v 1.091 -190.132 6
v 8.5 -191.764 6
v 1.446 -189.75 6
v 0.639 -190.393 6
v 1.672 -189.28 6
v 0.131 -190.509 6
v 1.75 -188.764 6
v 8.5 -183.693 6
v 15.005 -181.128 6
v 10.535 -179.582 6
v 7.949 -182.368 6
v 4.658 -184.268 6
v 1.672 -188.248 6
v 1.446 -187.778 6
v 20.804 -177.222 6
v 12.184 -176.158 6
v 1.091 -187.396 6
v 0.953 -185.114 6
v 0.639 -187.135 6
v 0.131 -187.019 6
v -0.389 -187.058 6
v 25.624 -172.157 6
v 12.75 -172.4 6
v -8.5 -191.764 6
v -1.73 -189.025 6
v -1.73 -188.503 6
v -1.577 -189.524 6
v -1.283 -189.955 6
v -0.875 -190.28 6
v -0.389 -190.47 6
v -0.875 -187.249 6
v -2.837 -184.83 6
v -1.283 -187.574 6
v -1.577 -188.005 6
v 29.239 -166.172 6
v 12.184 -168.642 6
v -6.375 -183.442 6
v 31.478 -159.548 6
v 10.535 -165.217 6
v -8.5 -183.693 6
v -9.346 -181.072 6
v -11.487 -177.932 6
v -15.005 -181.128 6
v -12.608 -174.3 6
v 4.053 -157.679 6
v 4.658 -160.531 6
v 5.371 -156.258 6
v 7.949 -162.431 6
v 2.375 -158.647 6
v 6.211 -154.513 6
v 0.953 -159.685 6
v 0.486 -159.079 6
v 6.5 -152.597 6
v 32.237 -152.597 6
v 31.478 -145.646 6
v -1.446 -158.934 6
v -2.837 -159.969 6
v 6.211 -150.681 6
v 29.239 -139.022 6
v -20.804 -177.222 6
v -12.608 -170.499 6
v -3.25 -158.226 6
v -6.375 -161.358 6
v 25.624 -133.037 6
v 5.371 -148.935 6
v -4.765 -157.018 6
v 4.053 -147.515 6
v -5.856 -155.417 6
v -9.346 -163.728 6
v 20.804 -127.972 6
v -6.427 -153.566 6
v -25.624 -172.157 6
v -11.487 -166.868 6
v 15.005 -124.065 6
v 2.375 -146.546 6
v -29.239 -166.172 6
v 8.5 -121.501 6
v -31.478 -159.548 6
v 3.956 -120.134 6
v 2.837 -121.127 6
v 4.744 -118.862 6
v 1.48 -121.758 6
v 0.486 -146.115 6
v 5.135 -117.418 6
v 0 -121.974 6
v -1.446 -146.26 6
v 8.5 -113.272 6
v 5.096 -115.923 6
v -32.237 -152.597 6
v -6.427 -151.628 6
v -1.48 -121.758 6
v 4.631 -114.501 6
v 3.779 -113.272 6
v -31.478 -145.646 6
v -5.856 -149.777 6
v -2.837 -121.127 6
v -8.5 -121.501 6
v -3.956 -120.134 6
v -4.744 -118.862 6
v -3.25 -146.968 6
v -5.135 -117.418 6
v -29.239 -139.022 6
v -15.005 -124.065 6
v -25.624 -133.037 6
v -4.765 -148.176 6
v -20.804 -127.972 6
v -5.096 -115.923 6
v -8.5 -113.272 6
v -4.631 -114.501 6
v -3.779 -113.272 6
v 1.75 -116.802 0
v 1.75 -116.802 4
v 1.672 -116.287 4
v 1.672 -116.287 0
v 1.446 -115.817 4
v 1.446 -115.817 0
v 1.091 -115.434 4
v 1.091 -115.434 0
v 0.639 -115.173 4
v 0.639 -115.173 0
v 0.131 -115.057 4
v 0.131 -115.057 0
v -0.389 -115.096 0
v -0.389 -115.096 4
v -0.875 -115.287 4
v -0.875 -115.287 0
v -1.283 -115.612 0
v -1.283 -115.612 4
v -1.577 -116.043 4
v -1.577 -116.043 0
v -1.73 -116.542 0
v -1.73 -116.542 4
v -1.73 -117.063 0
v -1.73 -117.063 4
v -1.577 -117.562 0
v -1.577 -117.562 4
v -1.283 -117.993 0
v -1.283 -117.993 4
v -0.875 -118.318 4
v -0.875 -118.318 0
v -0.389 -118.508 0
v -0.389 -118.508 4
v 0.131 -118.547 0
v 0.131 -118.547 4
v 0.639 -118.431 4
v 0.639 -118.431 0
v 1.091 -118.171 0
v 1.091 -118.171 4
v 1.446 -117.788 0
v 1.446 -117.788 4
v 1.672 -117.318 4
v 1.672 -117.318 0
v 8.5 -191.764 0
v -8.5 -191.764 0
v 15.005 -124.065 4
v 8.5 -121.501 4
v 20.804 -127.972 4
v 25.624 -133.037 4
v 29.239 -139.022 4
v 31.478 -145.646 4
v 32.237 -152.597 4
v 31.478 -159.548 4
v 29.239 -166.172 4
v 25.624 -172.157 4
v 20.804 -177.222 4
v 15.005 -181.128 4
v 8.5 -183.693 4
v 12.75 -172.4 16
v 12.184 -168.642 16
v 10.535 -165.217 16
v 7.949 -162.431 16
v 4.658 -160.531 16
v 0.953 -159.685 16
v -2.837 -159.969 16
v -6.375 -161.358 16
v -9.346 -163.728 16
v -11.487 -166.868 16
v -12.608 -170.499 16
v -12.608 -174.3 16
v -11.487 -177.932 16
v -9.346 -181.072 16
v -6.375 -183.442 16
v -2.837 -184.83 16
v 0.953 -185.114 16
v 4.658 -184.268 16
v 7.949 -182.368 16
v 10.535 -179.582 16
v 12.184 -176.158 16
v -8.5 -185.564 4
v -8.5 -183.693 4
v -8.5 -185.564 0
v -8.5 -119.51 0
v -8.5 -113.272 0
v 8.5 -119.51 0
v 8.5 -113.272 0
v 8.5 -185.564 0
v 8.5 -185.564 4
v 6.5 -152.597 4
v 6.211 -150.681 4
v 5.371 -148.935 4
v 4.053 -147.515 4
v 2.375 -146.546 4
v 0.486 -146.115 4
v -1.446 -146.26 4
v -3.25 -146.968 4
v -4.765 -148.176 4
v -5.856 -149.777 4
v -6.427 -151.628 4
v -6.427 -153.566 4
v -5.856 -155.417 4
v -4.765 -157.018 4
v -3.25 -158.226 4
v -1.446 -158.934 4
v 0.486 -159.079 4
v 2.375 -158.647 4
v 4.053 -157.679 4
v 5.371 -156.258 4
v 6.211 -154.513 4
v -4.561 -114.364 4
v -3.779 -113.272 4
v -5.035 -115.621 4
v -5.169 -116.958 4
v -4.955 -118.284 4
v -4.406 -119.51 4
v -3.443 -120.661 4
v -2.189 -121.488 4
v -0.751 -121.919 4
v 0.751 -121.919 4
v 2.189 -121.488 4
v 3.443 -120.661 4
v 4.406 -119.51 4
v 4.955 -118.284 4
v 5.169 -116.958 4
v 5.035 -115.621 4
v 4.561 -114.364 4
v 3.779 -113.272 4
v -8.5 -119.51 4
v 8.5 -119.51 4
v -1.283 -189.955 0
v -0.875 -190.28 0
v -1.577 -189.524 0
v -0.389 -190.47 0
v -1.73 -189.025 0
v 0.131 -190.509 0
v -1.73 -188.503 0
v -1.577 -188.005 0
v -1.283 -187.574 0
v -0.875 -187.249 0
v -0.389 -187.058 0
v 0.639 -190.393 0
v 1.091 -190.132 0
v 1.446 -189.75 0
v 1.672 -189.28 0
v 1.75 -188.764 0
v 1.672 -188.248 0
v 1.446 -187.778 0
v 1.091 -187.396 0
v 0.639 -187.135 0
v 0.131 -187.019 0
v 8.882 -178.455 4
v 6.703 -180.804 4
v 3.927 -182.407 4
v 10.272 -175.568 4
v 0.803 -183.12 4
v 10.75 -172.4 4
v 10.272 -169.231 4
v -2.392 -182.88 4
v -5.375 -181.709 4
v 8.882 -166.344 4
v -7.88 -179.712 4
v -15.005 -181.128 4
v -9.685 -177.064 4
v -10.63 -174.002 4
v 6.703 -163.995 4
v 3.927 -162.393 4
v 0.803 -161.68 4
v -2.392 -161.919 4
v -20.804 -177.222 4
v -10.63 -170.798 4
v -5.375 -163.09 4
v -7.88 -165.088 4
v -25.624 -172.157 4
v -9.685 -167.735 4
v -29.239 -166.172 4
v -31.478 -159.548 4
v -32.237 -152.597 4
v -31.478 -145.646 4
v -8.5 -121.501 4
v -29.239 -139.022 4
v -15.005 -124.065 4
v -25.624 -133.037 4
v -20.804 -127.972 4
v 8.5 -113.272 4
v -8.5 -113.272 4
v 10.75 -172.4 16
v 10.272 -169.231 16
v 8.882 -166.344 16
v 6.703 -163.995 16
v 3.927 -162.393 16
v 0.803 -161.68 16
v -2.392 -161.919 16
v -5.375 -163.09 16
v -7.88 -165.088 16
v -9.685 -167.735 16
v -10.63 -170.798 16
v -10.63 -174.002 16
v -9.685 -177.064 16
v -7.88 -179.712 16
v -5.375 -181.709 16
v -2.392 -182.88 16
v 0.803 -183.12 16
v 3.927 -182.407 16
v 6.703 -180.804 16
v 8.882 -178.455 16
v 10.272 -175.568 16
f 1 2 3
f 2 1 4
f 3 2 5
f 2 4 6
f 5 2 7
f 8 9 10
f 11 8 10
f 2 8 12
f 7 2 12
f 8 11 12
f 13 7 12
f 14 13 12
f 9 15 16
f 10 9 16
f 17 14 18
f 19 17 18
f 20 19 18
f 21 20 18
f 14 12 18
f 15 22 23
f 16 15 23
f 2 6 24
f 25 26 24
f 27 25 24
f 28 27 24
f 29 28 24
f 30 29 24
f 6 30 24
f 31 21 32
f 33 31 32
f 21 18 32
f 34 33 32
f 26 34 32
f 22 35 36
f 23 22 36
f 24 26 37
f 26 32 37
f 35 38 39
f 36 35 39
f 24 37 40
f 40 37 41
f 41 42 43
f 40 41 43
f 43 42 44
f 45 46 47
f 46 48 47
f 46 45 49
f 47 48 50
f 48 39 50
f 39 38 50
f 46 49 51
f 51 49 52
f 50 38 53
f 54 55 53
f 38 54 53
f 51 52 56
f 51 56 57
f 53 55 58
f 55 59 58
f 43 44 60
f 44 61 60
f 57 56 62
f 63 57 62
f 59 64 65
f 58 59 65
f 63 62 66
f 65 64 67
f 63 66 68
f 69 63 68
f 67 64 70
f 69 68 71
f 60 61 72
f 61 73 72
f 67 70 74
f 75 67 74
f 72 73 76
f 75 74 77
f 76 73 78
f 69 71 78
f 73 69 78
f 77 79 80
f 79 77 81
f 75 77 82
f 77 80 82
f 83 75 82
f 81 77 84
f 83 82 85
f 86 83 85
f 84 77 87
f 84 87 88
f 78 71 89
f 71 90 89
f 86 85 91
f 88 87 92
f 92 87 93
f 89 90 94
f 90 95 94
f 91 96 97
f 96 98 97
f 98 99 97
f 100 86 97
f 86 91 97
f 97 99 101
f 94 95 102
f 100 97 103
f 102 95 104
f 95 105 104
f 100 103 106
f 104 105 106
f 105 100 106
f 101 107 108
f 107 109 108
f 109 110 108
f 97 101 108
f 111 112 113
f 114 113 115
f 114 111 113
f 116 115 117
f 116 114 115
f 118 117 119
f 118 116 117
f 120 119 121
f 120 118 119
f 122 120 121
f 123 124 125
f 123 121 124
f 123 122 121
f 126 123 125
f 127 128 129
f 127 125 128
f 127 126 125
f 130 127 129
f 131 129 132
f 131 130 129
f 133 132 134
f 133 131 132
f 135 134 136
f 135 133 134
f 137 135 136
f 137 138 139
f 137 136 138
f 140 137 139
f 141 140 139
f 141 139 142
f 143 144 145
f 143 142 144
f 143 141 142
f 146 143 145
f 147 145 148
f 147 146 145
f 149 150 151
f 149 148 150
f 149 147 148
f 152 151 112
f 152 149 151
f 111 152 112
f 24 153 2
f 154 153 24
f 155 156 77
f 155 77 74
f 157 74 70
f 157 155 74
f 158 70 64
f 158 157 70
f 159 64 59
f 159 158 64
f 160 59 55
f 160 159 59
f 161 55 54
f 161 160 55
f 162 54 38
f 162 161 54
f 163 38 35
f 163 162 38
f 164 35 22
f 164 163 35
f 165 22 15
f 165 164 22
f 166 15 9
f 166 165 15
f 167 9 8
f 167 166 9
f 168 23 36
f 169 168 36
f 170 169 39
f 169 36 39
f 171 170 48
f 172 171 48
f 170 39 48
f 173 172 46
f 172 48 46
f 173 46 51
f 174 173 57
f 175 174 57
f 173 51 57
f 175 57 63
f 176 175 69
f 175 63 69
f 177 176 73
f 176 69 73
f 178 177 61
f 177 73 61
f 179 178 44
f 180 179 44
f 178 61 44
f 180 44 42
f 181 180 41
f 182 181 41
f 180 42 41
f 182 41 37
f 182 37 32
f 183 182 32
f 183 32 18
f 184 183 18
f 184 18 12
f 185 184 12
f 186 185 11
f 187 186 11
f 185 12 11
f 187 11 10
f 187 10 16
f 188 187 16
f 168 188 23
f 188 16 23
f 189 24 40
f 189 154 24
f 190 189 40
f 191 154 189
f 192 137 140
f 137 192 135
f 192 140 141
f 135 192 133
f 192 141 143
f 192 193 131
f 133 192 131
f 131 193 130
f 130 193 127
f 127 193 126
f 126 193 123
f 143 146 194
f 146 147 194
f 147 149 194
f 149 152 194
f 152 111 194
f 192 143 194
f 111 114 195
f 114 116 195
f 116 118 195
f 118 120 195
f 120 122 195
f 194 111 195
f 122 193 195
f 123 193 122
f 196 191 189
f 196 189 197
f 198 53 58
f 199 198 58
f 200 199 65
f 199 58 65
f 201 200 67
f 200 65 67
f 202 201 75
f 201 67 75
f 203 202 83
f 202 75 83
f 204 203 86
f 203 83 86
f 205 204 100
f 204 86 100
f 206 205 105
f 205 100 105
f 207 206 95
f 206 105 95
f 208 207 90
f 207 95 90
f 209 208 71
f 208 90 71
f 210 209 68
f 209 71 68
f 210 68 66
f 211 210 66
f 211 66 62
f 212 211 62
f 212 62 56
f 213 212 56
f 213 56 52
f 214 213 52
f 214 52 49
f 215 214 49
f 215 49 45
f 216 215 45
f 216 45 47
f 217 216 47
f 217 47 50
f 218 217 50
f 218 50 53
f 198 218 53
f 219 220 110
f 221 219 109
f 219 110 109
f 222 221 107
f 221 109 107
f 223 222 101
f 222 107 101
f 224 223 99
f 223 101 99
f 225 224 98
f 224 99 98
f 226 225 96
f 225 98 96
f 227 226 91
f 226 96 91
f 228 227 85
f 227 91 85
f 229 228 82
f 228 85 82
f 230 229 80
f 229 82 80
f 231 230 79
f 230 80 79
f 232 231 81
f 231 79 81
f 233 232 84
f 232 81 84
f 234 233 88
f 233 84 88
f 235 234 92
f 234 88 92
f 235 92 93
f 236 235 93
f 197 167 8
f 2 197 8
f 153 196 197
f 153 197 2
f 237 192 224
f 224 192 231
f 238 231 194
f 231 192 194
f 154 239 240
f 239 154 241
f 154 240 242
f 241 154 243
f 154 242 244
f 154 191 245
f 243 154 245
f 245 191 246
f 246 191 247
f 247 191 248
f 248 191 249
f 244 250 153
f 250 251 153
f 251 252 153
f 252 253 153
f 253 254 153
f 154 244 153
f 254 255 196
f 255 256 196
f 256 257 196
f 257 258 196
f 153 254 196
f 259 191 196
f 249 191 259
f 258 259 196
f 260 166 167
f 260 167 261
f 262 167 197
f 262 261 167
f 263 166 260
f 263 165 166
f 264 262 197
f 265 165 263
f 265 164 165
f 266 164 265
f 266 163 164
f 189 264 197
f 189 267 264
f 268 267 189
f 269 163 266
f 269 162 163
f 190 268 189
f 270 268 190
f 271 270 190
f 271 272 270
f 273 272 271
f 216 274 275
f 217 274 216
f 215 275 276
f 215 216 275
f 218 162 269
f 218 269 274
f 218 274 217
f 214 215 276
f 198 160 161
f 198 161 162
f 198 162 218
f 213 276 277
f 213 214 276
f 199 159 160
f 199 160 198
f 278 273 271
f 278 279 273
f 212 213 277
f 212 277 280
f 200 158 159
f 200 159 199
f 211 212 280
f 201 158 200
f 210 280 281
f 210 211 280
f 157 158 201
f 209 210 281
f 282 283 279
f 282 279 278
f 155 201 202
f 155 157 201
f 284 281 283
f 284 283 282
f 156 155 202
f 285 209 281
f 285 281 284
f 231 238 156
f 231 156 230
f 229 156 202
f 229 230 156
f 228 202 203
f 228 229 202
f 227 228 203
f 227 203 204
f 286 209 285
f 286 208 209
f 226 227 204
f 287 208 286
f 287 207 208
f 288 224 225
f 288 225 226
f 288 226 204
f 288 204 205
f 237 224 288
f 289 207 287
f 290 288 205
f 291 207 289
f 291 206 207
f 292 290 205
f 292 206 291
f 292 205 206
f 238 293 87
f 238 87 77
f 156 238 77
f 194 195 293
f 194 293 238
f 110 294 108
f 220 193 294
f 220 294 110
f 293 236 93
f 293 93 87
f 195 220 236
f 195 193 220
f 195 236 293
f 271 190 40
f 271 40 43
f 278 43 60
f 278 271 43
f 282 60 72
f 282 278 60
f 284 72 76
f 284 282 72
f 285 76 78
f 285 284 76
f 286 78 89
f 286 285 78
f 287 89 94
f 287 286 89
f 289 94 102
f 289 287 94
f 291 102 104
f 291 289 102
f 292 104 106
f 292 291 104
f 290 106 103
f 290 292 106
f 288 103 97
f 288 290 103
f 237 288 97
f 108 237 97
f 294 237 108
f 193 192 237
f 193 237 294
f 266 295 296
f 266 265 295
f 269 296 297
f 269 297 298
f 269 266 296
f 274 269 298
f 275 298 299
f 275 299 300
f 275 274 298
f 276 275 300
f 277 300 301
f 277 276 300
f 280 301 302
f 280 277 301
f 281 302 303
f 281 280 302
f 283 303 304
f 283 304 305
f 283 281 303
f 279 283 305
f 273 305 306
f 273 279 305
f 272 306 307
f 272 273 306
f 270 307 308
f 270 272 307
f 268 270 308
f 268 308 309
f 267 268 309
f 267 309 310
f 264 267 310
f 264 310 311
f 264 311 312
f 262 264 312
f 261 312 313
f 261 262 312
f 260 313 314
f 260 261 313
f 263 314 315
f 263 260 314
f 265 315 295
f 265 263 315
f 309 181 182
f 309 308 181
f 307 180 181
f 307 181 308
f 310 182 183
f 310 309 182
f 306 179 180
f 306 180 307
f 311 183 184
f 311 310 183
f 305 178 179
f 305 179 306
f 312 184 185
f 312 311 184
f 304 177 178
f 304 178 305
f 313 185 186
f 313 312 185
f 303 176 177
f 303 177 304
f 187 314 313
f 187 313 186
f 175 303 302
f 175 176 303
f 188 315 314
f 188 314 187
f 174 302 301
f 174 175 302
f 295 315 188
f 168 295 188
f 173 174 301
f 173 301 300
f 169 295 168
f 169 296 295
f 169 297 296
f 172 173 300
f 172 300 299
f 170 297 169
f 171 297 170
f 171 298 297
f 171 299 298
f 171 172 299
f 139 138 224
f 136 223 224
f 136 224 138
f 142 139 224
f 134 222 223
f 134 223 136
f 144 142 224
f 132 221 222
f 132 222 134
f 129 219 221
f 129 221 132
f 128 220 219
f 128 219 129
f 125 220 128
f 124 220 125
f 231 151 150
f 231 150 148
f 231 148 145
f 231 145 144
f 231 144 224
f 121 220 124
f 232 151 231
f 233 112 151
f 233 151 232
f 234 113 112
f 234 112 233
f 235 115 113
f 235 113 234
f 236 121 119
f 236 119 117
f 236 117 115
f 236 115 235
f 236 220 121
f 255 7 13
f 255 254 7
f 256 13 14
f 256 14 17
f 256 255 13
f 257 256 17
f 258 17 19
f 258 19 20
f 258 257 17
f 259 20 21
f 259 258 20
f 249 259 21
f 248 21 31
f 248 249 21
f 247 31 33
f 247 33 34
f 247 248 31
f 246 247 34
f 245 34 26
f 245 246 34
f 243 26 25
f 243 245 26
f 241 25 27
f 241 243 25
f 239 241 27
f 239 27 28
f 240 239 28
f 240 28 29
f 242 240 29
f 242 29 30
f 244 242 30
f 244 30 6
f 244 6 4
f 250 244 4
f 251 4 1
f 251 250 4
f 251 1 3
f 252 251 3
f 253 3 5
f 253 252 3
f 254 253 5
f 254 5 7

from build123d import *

# Parameters (mm, degrees)
SKETCH_1_W          = 17
SKETCH_1_H          = 6.237893195
SKETCH_1_R          = 1.75
EXTRUDE_1_DEPTH     = 4
SKETCH_1_H_2        = 6.200638702
EXTRUDE_1_2_DEPTH   = 4
SKETCH_3_R          = 10.75
SKETCH_3_R_2        = 1.75
EXTRUDE_3_DEPTH     = 2
SKETCH_4_R          = 6.5
CUT_EXTRUDE_1_DEPTH = 10
SKETCH_5_R          = 12.75
SKETCH_5_R_2        = 10.75
EXTRUDE_1_3_DEPTH   = 10
SKETCH_6_R          = 5.171558732
CUT_EXTRUDE_2_DEPTH = 2


with BuildPart() as part:
    # 草图1 → Extrude 1 (new body)
    with BuildSketch(Plane.XY):
        with Locations((0, -116.390757476)):
            Rectangle(SKETCH_1_W, SKETCH_1_H)
        with Locations((0, -116.802352716)):
            Circle(SKETCH_1_R, mode=Mode.SUBTRACT)
    extrude(amount=EXTRUDE_1_DEPTH)



with BuildPart() as body_2:
    # 草图1 → Extrude 1 2 (new body)
    with BuildSketch(Plane.XY):
        with Locations((0, -188.663897323)):
            Rectangle(SKETCH_1_W, SKETCH_1_H_2)
        with Locations((0, -188.764216674)):
            Circle(SKETCH_1_R, mode=Mode.SUBTRACT)
    extrude(amount=EXTRUDE_1_2_DEPTH)


with BuildPart() as part_1:
    add(part.part)

    add(body_2.part)  # 凸台-拉伸3 merges body 2
    # 草图3 → 凸台-拉伸3 (add)
    with BuildSketch(Plane.XY.offset(4)):
        with BuildLine():
            Line((-8.5, -113.271810879), (8.5, -113.271810879))
            Line((8.5, -113.271810879), (8.5, -121.50085412))
            ThreePointArc((8.5, -121.50085412), (32.236701024, -152.596752449), (8.5, -183.692650779))
            Line((8.5, -183.692650779), (8.5, -191.764216674))
            Line((8.5, -191.764216674), (-8.5, -191.764216674))
            Line((-8.5, -191.764216674), (-8.5, -183.692650779))
            ThreePointArc((-8.5, -183.692650779), (-32.236701024, -152.596752449), (-8.5, -121.50085412))
            Line((-8.5, -121.50085412), (-8.5, -113.271810879))
        make_face()
        with Locations((0, -172.399709936)):
            Circle(SKETCH_3_R, mode=Mode.SUBTRACT)
        with Locations((0, -188.764216674)):
            Circle(SKETCH_3_R_2, mode=Mode.SUBTRACT)
        with Locations((0, -116.802352716)):
            Circle(SKETCH_3_R_2, mode=Mode.SUBTRACT)
    extrude(amount=EXTRUDE_3_DEPTH)

    # 草图4 → 切除-拉伸1 (cut)
    with BuildSketch(Plane.XY.offset(6)):
        with Locations((0, -152.596752449)):
            Circle(SKETCH_4_R)
    extrude(amount=-CUT_EXTRUDE_1_DEPTH, mode=Mode.SUBTRACT)

    # 草图5 → Extrude 1 3 (add)
    with BuildSketch(Plane.XY.offset(6)):
        with Locations((0, -172.399709936)):
            Circle(SKETCH_5_R)
        with Locations((0, -172.399709936)):
            Circle(SKETCH_5_R_2, mode=Mode.SUBTRACT)
    extrude(amount=EXTRUDE_1_3_DEPTH)

    # 草图6 → 切除-拉伸2 (cut)
    with BuildSketch(Plane.XY.offset(6)):
        with Locations((0, -116.802352716)):
            Circle(SKETCH_6_R)
    extrude(amount=-CUT_EXTRUDE_2_DEPTH, mode=Mode.SUBTRACT)


solid = part_1.part
